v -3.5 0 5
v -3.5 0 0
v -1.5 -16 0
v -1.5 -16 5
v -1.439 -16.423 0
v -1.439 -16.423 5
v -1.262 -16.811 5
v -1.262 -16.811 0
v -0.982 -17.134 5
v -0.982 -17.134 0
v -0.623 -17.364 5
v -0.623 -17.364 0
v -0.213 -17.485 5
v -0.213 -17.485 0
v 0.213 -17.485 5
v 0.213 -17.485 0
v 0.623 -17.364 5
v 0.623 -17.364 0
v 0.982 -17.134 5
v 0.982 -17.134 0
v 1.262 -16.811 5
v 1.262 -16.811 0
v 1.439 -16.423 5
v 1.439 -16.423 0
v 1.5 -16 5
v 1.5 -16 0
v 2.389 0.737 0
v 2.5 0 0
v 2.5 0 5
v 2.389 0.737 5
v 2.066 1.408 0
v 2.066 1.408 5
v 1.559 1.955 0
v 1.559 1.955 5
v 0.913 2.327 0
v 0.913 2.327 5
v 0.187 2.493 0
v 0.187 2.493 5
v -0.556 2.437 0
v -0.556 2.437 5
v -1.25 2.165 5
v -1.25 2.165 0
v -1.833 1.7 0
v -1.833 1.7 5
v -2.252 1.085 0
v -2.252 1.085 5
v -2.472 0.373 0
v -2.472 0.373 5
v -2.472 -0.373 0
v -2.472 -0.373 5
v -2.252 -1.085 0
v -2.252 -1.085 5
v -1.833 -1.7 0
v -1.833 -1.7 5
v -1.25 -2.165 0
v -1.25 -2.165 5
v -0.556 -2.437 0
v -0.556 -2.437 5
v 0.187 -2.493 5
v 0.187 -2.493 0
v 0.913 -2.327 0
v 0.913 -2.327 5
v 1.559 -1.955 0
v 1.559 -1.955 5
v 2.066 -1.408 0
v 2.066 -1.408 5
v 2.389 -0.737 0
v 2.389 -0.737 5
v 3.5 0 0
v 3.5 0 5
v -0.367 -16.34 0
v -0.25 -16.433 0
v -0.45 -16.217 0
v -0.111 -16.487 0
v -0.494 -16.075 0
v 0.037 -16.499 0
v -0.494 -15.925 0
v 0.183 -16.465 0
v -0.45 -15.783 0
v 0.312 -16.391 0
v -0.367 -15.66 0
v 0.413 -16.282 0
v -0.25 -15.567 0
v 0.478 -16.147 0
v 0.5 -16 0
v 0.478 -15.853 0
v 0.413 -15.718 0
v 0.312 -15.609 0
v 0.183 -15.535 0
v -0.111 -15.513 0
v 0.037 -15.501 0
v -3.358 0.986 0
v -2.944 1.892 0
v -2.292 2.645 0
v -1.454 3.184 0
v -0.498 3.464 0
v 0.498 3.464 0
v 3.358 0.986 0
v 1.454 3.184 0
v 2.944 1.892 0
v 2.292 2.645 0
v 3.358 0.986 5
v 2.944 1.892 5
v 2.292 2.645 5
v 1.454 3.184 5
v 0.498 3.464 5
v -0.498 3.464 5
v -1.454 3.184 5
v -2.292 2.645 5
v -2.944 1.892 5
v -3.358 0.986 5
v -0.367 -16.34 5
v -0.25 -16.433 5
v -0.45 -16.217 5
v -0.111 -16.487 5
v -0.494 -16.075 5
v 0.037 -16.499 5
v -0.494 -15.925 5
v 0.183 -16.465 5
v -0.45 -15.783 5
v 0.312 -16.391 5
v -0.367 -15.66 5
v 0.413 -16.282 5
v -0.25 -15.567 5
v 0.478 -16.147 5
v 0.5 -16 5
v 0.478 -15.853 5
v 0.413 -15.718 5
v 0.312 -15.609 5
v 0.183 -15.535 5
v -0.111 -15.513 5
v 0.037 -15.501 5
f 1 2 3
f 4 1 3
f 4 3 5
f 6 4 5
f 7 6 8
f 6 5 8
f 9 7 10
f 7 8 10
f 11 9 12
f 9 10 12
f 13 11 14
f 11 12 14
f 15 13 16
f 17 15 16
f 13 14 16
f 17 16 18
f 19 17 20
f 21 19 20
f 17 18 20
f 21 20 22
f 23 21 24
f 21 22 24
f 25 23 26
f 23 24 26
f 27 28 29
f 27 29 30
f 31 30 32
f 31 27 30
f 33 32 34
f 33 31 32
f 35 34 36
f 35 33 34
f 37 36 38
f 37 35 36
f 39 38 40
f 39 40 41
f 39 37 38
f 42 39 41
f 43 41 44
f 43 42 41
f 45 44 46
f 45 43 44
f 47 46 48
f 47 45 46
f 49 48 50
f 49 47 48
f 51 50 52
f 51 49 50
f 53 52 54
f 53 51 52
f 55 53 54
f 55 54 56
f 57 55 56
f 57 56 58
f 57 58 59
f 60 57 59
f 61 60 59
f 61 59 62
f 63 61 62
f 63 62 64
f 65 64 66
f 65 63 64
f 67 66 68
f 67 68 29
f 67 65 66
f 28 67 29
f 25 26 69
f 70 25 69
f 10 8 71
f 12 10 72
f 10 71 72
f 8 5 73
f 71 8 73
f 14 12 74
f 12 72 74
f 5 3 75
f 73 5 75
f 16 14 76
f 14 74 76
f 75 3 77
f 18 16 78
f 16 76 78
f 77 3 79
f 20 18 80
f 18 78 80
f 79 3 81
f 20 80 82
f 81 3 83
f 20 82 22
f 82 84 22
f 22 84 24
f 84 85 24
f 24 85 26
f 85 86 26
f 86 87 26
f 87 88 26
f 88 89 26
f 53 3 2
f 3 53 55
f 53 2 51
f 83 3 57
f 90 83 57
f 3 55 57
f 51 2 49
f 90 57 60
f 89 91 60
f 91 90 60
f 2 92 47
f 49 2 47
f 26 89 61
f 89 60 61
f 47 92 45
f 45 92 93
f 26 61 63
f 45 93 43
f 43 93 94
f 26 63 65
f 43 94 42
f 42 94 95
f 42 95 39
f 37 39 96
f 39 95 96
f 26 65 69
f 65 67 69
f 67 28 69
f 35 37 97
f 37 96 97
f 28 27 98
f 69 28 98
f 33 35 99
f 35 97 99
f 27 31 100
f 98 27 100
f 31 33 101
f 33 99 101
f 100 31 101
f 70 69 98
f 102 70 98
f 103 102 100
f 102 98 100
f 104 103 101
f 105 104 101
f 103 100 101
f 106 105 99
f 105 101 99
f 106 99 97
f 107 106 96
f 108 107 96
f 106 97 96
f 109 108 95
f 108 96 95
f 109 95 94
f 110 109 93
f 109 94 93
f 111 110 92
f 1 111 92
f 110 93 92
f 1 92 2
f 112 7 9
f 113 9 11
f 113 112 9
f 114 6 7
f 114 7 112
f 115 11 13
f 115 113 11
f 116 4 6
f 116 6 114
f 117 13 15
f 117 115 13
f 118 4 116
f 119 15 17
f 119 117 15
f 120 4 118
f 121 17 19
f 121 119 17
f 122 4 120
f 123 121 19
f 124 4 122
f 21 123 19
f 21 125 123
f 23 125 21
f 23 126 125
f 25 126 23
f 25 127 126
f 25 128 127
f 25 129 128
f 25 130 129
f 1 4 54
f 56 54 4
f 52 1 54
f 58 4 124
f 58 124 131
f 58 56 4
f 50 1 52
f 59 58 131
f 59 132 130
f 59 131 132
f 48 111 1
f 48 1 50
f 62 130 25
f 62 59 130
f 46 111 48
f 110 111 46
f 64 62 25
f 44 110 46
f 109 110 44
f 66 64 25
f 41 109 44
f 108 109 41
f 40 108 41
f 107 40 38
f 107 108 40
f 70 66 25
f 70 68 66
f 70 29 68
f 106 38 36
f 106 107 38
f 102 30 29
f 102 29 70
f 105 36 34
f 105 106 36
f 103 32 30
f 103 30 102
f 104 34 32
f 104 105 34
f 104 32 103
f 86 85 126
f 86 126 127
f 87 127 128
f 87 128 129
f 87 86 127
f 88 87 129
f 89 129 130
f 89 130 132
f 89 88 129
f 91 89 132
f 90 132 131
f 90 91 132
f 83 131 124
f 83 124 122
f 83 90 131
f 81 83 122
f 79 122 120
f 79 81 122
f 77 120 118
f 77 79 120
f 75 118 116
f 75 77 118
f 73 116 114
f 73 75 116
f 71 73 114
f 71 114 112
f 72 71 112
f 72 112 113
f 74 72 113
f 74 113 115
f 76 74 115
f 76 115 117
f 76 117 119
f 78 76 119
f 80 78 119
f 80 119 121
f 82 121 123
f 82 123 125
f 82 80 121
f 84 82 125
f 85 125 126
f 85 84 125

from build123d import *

# Parameters (mm, degrees)
CROQUIS1_R              = 2.5
CROQUIS1_R_2            = 0.5
SALIENTE_EXTRUIR1_DEPTH = 5


with BuildPart() as part:
    # Croquis1 → Saliente-Extruir1 (new body)
    with BuildSketch(Plane.XY):
        with BuildLine():
            Line((-3.5, 0), (-1.5, -16))
            ThreePointArc((-1.5, -16), (0, -17.5), (1.5, -16))
            Line((1.5, -16), (3.5, 0))
            ThreePointArc((3.5, 0), (0, 3.5), (-3.5, 0))
        make_face()
        Circle(CROQUIS1_R, mode=Mode.SUBTRACT)
        with Locations((0, -16)):
            Circle(CROQUIS1_R_2, mode=Mode.SUBTRACT)
    extrude(amount=SALIENTE_EXTRUIR1_DEPTH)


solid = part.part
